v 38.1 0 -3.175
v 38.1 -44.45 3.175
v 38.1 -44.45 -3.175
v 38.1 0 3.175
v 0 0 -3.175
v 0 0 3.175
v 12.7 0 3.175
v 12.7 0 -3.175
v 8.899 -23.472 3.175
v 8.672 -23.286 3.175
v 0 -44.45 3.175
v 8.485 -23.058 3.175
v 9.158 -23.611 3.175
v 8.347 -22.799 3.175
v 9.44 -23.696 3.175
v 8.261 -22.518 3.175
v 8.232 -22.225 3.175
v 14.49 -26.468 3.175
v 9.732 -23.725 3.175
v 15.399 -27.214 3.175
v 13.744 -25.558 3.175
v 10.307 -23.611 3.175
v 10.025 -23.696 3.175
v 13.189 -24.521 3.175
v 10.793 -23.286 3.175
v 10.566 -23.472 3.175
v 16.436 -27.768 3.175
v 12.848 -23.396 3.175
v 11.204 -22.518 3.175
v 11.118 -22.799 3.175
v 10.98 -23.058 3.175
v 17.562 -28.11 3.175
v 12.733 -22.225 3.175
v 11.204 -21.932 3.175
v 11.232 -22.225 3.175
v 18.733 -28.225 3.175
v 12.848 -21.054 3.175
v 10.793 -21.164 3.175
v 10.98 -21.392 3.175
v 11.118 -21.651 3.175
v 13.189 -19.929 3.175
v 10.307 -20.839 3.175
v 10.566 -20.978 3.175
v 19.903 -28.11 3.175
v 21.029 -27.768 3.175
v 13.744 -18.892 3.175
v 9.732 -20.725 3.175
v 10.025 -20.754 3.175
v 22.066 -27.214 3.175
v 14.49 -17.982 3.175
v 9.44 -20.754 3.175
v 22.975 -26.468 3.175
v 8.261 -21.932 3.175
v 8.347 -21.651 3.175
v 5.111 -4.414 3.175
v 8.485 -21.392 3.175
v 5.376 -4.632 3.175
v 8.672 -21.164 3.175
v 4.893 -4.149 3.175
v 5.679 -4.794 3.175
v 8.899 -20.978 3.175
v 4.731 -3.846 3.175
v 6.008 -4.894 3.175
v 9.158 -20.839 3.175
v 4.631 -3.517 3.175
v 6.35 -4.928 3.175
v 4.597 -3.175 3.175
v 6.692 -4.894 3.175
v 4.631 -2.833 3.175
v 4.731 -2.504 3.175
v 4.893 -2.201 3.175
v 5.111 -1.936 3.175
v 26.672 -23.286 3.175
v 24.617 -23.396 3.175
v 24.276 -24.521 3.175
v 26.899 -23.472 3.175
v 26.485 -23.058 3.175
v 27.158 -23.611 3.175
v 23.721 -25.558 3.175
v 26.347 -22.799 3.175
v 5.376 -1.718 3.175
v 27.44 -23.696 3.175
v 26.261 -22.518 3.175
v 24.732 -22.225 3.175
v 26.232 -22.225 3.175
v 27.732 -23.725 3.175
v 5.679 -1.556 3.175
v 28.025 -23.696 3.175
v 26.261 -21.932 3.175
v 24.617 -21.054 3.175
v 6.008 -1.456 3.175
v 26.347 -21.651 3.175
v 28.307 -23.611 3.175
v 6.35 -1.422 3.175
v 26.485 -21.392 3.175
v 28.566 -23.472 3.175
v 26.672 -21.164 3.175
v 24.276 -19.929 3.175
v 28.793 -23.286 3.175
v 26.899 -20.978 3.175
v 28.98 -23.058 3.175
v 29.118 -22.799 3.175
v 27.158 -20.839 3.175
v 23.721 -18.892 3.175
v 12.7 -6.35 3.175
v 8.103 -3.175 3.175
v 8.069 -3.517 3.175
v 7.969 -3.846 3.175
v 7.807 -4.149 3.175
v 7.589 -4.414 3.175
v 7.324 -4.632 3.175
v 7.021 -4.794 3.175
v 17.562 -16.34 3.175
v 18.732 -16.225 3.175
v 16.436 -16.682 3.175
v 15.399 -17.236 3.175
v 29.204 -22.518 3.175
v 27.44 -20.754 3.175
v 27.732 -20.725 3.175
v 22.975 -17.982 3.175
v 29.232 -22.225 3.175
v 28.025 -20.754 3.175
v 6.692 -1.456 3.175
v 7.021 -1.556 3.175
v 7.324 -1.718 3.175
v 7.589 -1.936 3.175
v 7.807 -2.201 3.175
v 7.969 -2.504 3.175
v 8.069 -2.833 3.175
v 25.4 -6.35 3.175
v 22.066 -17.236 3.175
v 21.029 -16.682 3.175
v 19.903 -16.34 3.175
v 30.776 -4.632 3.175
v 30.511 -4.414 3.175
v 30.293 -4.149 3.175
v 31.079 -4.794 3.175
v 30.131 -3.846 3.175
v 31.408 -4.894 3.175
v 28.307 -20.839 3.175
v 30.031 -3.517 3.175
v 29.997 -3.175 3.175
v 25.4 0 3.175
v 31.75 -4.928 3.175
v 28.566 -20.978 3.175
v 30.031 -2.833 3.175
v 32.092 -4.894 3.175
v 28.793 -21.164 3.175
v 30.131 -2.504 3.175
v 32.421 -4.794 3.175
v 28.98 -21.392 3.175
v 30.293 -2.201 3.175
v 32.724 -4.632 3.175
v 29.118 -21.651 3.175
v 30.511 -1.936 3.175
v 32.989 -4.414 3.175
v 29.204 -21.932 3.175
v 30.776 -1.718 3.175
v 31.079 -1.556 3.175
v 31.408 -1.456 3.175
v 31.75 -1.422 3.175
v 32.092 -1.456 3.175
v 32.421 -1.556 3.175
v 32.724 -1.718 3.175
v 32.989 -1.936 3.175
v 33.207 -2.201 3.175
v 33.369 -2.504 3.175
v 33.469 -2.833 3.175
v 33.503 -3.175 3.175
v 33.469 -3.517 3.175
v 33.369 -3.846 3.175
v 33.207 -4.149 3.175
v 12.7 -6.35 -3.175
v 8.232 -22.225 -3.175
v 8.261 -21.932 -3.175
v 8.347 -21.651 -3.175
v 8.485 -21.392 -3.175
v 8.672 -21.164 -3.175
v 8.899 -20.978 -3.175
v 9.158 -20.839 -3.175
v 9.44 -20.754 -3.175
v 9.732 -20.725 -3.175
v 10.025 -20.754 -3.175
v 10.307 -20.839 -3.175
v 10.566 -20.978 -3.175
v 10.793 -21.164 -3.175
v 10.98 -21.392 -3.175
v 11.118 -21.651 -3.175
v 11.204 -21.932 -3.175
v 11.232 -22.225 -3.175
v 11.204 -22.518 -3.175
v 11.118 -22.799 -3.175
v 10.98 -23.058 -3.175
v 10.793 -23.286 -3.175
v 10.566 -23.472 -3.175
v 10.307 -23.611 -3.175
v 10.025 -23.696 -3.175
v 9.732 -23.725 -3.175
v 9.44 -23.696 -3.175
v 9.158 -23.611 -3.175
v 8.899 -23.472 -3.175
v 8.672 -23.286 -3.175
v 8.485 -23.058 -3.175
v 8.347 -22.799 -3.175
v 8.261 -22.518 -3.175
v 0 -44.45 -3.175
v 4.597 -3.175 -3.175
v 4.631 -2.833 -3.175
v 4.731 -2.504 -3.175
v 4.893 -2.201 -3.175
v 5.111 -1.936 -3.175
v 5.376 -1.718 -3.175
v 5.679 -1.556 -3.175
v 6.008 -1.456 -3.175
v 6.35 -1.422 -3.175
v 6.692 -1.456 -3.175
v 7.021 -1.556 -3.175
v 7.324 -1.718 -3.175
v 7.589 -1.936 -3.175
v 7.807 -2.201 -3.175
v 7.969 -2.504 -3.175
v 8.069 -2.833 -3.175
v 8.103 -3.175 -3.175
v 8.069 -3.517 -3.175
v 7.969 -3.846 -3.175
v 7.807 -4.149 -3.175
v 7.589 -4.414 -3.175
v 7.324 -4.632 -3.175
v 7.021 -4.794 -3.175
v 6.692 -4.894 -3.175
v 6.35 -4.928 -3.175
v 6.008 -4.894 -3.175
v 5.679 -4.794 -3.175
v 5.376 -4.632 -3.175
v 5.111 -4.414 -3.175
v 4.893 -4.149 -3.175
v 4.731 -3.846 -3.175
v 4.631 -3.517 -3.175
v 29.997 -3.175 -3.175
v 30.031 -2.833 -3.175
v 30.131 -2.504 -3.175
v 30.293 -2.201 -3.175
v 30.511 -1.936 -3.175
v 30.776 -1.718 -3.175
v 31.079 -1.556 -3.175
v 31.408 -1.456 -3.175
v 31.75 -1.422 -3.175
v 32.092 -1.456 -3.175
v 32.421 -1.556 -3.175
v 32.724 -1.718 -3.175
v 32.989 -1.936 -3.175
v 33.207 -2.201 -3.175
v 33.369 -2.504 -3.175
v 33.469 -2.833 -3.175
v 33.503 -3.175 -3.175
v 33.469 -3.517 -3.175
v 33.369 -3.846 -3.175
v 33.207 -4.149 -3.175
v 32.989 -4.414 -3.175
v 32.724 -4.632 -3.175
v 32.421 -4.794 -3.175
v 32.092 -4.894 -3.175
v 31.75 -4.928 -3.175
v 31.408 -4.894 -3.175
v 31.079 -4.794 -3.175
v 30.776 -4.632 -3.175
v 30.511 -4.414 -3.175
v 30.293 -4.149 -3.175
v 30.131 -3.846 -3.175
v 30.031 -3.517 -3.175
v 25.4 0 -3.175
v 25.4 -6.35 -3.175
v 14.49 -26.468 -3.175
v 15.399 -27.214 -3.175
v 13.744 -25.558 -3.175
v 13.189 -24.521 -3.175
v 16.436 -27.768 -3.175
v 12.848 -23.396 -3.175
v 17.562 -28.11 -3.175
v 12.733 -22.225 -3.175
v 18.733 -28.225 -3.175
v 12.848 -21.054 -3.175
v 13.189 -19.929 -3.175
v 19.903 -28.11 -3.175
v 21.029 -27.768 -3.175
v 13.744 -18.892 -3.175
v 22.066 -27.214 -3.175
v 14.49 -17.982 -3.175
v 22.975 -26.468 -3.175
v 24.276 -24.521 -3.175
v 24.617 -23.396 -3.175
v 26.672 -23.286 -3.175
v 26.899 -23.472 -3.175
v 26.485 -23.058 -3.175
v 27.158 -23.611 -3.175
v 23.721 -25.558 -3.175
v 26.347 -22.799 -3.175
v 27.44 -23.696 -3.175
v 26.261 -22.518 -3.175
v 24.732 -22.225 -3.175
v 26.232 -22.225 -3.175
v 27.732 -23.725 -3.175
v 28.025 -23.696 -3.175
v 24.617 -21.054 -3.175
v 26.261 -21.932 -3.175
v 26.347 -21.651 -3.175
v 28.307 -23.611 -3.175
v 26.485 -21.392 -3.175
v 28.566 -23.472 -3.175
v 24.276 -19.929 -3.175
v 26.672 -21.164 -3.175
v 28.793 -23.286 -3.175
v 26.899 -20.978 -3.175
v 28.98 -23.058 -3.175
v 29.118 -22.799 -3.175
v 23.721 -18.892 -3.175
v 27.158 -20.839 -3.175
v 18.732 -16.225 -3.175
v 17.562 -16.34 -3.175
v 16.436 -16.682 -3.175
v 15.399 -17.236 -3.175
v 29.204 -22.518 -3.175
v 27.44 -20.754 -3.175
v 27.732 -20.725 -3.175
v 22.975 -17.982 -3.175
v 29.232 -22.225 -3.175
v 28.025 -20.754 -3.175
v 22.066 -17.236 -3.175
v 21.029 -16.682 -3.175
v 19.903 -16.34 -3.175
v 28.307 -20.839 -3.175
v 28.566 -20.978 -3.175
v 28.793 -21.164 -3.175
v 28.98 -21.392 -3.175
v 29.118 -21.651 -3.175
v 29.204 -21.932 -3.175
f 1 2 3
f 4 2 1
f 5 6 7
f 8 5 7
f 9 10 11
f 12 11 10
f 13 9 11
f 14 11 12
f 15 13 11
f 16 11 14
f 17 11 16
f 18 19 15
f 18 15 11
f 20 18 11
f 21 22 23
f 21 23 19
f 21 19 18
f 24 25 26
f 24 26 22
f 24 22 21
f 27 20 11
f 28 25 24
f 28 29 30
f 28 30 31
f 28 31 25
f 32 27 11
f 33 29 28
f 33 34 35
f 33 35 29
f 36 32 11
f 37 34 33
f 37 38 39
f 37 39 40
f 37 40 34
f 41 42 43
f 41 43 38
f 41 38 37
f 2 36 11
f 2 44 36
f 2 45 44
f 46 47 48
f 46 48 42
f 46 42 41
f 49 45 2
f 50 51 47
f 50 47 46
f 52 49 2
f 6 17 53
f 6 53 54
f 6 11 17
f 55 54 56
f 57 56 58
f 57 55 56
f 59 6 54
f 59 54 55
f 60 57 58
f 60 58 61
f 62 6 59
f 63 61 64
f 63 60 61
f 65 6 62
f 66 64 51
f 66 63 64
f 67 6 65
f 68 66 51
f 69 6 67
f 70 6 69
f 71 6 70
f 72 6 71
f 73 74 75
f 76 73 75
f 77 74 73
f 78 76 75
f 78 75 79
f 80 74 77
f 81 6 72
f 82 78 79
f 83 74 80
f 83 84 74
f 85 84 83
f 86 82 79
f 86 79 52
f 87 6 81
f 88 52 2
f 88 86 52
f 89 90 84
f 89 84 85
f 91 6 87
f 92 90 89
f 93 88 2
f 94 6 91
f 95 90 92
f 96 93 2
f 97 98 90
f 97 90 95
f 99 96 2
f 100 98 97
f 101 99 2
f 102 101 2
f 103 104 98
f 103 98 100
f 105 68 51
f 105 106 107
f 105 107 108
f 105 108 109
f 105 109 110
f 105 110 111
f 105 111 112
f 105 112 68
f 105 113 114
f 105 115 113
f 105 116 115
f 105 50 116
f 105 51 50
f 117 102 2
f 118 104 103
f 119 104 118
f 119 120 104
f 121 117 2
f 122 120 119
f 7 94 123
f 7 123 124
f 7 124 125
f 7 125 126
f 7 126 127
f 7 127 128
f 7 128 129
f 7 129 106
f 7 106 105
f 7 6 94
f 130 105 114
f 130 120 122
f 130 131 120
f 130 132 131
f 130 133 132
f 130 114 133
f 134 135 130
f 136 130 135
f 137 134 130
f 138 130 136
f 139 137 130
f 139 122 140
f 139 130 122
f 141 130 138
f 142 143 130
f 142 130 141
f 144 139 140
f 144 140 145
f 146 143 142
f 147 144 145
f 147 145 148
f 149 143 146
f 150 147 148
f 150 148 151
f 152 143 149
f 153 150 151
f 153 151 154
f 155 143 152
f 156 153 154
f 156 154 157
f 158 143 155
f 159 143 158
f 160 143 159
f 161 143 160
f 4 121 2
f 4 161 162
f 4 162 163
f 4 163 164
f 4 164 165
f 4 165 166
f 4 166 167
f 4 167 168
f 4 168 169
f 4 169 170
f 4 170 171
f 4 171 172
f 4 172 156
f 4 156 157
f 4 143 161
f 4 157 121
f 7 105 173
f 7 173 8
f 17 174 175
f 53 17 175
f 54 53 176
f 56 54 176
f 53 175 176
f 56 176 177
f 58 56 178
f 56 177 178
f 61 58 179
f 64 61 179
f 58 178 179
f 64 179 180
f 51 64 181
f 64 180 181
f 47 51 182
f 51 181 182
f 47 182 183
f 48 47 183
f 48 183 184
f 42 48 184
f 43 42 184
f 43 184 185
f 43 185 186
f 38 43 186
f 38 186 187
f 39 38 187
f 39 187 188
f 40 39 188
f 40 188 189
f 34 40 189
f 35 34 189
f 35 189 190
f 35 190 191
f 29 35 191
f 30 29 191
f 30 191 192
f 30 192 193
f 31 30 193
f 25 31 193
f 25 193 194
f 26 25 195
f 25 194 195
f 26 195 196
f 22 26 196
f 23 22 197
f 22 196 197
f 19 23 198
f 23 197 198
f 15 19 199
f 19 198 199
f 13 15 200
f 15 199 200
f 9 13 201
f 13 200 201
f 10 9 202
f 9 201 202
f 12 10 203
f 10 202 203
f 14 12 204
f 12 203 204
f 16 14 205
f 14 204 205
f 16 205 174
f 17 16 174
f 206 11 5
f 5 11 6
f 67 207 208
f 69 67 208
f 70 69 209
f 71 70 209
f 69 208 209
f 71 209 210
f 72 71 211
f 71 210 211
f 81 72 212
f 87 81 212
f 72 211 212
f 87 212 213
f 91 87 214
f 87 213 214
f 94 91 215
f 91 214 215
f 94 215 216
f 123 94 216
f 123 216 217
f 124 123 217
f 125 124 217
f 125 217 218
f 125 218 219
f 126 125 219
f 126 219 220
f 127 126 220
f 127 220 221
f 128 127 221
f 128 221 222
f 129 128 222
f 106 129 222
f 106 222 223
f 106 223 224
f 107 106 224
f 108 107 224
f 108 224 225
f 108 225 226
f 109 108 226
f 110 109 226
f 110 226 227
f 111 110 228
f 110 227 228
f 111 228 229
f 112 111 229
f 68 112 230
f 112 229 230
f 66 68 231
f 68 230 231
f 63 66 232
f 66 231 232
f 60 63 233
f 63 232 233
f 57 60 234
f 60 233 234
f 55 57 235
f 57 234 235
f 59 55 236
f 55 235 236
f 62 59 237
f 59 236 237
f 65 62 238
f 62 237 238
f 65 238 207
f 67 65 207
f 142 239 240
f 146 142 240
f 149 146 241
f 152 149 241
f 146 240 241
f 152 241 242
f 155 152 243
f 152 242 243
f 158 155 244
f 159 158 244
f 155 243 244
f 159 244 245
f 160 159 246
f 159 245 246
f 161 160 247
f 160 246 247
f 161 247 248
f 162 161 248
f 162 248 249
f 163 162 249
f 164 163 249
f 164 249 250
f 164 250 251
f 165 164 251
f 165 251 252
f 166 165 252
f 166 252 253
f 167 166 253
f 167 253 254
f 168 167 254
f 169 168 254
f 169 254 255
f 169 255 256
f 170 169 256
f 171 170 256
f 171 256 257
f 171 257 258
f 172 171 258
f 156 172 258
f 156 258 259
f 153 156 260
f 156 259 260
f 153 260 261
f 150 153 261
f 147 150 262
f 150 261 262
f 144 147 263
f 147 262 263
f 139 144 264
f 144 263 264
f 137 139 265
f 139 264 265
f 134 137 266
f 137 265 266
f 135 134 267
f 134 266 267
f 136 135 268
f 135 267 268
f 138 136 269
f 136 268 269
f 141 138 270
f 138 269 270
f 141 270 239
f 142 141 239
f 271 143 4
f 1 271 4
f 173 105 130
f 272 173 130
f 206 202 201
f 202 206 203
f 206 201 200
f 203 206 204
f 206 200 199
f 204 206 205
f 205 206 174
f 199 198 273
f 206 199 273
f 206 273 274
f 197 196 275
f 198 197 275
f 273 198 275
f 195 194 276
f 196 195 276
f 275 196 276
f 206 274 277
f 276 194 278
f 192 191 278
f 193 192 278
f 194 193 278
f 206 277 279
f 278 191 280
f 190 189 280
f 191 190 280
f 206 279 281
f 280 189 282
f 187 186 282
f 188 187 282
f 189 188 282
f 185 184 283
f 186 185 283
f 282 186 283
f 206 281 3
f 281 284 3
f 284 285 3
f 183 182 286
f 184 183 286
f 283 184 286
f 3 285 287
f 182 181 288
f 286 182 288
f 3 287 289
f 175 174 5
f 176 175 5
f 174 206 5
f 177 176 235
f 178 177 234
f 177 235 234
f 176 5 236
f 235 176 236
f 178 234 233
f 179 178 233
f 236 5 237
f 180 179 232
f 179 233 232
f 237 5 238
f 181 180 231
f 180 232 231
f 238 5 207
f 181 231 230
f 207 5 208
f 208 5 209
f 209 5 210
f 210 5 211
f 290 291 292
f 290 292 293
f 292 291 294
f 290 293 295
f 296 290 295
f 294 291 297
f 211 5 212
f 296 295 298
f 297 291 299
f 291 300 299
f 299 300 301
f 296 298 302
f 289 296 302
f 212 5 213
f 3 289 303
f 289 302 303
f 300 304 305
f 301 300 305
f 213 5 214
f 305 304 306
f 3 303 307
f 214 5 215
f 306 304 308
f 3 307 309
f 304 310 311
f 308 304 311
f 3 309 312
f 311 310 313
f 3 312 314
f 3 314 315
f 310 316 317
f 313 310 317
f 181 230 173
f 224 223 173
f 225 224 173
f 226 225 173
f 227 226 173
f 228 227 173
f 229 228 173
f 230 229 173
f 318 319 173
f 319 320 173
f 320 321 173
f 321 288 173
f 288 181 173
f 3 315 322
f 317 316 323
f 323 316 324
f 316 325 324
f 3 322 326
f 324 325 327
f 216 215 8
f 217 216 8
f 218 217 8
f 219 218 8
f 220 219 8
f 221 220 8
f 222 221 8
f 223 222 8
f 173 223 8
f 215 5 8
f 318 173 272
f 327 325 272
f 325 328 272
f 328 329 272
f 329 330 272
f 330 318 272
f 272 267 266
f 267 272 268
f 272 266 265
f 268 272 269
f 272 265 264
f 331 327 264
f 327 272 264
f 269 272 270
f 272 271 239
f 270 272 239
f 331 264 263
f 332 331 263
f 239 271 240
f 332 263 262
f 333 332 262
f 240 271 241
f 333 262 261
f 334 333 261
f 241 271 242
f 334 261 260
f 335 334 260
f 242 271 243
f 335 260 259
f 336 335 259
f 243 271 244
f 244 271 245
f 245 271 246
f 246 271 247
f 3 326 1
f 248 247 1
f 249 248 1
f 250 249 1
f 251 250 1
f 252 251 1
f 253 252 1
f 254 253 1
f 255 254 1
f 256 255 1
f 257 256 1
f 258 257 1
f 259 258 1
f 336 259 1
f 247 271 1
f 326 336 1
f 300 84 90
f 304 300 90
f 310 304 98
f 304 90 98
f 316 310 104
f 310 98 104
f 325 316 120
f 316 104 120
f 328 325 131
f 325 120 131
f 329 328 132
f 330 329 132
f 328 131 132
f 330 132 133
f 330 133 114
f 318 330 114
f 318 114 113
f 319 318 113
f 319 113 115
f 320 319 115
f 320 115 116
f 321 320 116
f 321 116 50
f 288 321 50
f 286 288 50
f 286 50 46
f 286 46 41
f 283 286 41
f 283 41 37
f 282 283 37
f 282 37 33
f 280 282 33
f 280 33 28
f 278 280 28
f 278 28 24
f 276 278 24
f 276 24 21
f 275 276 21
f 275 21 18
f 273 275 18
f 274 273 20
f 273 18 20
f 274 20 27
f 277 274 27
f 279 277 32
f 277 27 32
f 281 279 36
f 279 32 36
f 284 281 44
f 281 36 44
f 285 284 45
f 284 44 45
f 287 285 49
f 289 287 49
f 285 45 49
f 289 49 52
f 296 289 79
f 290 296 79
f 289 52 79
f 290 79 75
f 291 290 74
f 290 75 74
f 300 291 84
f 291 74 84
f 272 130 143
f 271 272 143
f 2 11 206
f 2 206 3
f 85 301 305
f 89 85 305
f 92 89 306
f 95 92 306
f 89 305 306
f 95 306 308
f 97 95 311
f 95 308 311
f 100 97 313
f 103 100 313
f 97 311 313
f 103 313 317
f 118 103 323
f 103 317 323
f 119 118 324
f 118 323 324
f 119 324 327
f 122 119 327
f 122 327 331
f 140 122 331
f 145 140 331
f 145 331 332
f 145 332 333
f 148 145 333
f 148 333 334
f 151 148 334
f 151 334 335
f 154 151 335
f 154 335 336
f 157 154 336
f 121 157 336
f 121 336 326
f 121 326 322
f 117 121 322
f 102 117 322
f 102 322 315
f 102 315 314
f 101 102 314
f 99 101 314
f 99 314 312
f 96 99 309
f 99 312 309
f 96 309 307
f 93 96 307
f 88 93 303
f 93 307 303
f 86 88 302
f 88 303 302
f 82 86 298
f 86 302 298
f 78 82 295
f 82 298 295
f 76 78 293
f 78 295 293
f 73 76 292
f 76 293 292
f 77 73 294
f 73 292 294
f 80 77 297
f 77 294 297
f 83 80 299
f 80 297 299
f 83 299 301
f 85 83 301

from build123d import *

# Parameters (mm, degrees)
SKETCH1_W             = 38.1
SKETCH1_H             = 44.45
BOSS_EXTRUDE1_DEPTH   = 3.175
F_6_CLEARANCE_HOLE1_D = 3.5052
CUT_EXTRUDE3_REACH    = 60.887
SKETCH6_W             = 12.7
SKETCH6_H             = 6.35
CUT_EXTRUDE4_REACH    = 60.887
SKETCH7_R             = 6
M3_CLEARANCE_HOLE1_D  = 3


with BuildPart() as part:
    # Sketch1 → Boss-Extrude1 (new, symmetric)
    with BuildSketch(Plane.XY):
        with Locations((19.05, -22.225)):
            Rectangle(SKETCH1_W, SKETCH1_H)
    extrude(amount=BOSS_EXTRUDE1_DEPTH, both=True)

    # #6 Clearance Hole1 (through all)
    with Locations(Plane.XY.offset(3.175)):
        with Locations((6.35, -3.175), (31.75, -3.175)):
            Hole(F_6_CLEARANCE_HOLE1_D / 2)

    # Sketch6 → Cut-Extrude3 (cut, up to next)
    with BuildSketch(Plane.XY.offset(3.175), mode=Mode.PRIVATE) as cut_extrude3_sk1:
        with Locations((19.05, -3.175)):
            Rectangle(SKETCH6_W, SKETCH6_H)
    cut_extrude3_tool1 = extrude(cut_extrude3_sk1.sketch, amount=-CUT_EXTRUDE3_REACH, mode=Mode.PRIVATE) & part.part
    add(cut_extrude3_tool1.solids().sort_by_distance((19.05, -3.175, 3.175))[0], mode=Mode.SUBTRACT)

    # Sketch7 → Cut-Extrude4 (cut, up to next)
    with BuildSketch(Plane.XY.offset(3.175), mode=Mode.PRIVATE) as cut_extrude4_sk1:
        with Locations((18.7325, -22.225)):
            Circle(SKETCH7_R)
    cut_extrude4_tool1 = extrude(cut_extrude4_sk1.sketch, amount=-CUT_EXTRUDE4_REACH, mode=Mode.PRIVATE) & part.part
    add(cut_extrude4_tool1.solids().sort_by_distance((18.7325, -22.225, 3.175))[0], mode=Mode.SUBTRACT)

    # M3 Clearance Hole1 (through all)
    with Locations(Plane.XY.offset(3.175)):
        with Locations((27.7325, -22.225), (9.7325, -22.225)):
            Hole(M3_CLEARANCE_HOLE1_D / 2)


solid = part.part
